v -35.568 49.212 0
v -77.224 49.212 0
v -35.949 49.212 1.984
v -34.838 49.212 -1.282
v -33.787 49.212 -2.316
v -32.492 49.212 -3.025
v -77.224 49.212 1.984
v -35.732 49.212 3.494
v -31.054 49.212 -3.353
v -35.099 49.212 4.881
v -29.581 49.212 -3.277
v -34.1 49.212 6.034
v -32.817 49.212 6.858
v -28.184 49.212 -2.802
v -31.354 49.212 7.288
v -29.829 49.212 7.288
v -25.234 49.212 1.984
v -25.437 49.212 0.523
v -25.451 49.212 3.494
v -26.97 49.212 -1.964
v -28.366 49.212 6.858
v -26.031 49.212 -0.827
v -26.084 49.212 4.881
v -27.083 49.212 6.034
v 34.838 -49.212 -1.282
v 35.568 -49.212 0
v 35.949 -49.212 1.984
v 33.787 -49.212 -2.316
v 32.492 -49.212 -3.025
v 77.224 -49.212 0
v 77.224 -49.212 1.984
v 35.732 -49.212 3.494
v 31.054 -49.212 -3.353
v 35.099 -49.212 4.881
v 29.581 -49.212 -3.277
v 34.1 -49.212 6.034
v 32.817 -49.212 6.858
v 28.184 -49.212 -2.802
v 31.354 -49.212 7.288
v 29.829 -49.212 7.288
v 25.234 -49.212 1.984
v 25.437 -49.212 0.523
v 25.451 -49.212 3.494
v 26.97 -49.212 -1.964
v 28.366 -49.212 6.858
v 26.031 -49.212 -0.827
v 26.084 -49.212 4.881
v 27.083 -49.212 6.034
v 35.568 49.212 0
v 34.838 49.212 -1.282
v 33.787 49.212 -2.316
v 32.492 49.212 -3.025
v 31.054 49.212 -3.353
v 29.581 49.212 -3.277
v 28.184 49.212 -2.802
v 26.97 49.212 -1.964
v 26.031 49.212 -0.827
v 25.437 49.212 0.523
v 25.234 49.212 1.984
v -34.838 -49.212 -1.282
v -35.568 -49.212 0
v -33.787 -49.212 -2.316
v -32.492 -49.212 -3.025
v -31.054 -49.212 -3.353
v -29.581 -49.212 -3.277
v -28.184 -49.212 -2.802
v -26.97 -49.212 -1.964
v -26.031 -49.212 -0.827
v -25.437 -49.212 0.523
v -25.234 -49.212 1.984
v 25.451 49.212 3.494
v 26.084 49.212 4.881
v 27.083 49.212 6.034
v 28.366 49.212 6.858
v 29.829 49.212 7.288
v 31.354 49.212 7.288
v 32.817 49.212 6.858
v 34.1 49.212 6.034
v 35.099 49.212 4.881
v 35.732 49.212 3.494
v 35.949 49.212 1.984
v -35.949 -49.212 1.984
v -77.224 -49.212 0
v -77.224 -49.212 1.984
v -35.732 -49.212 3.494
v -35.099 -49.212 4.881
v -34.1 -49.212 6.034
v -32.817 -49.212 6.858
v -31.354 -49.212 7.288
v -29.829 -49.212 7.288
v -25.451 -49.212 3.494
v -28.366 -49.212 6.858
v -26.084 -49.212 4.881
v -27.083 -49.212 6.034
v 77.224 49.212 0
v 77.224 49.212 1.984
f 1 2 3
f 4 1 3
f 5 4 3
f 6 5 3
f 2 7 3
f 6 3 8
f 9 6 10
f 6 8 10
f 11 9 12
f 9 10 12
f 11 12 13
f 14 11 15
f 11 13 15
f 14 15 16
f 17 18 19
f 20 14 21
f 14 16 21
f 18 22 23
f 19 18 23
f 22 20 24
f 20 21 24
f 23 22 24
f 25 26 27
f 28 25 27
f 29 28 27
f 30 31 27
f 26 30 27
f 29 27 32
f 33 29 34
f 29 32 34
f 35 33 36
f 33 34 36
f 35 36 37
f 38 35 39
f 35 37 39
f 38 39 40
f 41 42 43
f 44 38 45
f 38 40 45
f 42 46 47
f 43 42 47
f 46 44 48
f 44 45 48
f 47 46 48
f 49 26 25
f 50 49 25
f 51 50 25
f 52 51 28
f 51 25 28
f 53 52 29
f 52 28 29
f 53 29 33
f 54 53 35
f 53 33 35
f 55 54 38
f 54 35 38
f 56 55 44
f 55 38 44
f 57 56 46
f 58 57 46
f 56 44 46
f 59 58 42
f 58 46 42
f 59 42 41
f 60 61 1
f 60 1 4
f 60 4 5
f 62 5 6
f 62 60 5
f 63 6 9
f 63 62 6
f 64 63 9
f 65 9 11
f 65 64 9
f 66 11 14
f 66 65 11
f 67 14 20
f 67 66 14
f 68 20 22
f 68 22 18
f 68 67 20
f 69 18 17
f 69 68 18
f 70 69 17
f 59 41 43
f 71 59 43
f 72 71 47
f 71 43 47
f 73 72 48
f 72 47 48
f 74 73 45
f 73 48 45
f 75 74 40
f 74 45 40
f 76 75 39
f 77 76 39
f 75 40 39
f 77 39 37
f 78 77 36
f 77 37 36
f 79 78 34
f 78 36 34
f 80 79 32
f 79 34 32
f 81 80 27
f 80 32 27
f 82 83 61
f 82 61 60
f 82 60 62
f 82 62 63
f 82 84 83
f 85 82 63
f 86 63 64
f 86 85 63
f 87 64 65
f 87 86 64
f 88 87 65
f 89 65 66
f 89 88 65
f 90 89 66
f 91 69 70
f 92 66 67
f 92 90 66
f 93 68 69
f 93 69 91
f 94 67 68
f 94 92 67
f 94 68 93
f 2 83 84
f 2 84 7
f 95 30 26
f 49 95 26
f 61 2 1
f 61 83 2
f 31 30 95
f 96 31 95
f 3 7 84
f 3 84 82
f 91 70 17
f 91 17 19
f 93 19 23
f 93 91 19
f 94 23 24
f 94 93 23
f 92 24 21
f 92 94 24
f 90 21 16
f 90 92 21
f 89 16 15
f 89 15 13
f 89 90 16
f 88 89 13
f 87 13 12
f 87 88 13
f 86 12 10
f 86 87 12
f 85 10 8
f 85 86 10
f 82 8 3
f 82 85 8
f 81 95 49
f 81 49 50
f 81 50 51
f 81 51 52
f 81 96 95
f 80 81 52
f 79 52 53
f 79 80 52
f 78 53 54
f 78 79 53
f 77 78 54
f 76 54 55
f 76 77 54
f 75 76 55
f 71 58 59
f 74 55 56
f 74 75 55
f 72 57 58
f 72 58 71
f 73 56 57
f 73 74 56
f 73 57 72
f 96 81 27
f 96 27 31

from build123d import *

# Parameters (mm, degrees)
F0_W     = 41.275
F0_H     = 98.425
F1_DEPTH = 1.984375
F3_DEPTH = 98.425


with BuildPart() as f1:
    # F0 (on Top) → F1 (new body)
    with BuildSketch(Plane.XY):
        with Locations((-56.586691, 0)):
            Rectangle(F0_W, F0_H)
        with Locations((56.586691, 0)):
            Rectangle(F0_W, F0_H)
    extrude(amount=F1_DEPTH)

    # F2 (on face) → F3 (join)
    with BuildSketch(Plane.XZ.offset(49.2125)):
        with BuildLine():
            ThreePointArc((-35.568166, 0), (-35.853073, 0.974063), (-35.949191, 1.984375))
            Line((-35.949191, 1.984375), (-35.949191, 0))
            Line((-35.949191, 0), (-35.568166, 0))
        make_face()
        with BuildLine():
            ThreePointArc((-35.568166, 0), (-29.581067, -3.277319), (-25.233566, 1.984375))
            ThreePointArc((-25.233566, 1.984375), (-30.591379, 7.342187), (-35.949191, 1.984375))
            ThreePointArc((-35.949191, 1.984375), (-35.853073, 0.974063), (-35.568166, 0))
        make_face()
    extrude(amount=-F3_DEPTH)

    # F4: F1 across plane


with BuildPart() as f1_1:
    add(f1.part)
    add(f1.part.mirror(Plane.YZ))


solid = f1_1.part
